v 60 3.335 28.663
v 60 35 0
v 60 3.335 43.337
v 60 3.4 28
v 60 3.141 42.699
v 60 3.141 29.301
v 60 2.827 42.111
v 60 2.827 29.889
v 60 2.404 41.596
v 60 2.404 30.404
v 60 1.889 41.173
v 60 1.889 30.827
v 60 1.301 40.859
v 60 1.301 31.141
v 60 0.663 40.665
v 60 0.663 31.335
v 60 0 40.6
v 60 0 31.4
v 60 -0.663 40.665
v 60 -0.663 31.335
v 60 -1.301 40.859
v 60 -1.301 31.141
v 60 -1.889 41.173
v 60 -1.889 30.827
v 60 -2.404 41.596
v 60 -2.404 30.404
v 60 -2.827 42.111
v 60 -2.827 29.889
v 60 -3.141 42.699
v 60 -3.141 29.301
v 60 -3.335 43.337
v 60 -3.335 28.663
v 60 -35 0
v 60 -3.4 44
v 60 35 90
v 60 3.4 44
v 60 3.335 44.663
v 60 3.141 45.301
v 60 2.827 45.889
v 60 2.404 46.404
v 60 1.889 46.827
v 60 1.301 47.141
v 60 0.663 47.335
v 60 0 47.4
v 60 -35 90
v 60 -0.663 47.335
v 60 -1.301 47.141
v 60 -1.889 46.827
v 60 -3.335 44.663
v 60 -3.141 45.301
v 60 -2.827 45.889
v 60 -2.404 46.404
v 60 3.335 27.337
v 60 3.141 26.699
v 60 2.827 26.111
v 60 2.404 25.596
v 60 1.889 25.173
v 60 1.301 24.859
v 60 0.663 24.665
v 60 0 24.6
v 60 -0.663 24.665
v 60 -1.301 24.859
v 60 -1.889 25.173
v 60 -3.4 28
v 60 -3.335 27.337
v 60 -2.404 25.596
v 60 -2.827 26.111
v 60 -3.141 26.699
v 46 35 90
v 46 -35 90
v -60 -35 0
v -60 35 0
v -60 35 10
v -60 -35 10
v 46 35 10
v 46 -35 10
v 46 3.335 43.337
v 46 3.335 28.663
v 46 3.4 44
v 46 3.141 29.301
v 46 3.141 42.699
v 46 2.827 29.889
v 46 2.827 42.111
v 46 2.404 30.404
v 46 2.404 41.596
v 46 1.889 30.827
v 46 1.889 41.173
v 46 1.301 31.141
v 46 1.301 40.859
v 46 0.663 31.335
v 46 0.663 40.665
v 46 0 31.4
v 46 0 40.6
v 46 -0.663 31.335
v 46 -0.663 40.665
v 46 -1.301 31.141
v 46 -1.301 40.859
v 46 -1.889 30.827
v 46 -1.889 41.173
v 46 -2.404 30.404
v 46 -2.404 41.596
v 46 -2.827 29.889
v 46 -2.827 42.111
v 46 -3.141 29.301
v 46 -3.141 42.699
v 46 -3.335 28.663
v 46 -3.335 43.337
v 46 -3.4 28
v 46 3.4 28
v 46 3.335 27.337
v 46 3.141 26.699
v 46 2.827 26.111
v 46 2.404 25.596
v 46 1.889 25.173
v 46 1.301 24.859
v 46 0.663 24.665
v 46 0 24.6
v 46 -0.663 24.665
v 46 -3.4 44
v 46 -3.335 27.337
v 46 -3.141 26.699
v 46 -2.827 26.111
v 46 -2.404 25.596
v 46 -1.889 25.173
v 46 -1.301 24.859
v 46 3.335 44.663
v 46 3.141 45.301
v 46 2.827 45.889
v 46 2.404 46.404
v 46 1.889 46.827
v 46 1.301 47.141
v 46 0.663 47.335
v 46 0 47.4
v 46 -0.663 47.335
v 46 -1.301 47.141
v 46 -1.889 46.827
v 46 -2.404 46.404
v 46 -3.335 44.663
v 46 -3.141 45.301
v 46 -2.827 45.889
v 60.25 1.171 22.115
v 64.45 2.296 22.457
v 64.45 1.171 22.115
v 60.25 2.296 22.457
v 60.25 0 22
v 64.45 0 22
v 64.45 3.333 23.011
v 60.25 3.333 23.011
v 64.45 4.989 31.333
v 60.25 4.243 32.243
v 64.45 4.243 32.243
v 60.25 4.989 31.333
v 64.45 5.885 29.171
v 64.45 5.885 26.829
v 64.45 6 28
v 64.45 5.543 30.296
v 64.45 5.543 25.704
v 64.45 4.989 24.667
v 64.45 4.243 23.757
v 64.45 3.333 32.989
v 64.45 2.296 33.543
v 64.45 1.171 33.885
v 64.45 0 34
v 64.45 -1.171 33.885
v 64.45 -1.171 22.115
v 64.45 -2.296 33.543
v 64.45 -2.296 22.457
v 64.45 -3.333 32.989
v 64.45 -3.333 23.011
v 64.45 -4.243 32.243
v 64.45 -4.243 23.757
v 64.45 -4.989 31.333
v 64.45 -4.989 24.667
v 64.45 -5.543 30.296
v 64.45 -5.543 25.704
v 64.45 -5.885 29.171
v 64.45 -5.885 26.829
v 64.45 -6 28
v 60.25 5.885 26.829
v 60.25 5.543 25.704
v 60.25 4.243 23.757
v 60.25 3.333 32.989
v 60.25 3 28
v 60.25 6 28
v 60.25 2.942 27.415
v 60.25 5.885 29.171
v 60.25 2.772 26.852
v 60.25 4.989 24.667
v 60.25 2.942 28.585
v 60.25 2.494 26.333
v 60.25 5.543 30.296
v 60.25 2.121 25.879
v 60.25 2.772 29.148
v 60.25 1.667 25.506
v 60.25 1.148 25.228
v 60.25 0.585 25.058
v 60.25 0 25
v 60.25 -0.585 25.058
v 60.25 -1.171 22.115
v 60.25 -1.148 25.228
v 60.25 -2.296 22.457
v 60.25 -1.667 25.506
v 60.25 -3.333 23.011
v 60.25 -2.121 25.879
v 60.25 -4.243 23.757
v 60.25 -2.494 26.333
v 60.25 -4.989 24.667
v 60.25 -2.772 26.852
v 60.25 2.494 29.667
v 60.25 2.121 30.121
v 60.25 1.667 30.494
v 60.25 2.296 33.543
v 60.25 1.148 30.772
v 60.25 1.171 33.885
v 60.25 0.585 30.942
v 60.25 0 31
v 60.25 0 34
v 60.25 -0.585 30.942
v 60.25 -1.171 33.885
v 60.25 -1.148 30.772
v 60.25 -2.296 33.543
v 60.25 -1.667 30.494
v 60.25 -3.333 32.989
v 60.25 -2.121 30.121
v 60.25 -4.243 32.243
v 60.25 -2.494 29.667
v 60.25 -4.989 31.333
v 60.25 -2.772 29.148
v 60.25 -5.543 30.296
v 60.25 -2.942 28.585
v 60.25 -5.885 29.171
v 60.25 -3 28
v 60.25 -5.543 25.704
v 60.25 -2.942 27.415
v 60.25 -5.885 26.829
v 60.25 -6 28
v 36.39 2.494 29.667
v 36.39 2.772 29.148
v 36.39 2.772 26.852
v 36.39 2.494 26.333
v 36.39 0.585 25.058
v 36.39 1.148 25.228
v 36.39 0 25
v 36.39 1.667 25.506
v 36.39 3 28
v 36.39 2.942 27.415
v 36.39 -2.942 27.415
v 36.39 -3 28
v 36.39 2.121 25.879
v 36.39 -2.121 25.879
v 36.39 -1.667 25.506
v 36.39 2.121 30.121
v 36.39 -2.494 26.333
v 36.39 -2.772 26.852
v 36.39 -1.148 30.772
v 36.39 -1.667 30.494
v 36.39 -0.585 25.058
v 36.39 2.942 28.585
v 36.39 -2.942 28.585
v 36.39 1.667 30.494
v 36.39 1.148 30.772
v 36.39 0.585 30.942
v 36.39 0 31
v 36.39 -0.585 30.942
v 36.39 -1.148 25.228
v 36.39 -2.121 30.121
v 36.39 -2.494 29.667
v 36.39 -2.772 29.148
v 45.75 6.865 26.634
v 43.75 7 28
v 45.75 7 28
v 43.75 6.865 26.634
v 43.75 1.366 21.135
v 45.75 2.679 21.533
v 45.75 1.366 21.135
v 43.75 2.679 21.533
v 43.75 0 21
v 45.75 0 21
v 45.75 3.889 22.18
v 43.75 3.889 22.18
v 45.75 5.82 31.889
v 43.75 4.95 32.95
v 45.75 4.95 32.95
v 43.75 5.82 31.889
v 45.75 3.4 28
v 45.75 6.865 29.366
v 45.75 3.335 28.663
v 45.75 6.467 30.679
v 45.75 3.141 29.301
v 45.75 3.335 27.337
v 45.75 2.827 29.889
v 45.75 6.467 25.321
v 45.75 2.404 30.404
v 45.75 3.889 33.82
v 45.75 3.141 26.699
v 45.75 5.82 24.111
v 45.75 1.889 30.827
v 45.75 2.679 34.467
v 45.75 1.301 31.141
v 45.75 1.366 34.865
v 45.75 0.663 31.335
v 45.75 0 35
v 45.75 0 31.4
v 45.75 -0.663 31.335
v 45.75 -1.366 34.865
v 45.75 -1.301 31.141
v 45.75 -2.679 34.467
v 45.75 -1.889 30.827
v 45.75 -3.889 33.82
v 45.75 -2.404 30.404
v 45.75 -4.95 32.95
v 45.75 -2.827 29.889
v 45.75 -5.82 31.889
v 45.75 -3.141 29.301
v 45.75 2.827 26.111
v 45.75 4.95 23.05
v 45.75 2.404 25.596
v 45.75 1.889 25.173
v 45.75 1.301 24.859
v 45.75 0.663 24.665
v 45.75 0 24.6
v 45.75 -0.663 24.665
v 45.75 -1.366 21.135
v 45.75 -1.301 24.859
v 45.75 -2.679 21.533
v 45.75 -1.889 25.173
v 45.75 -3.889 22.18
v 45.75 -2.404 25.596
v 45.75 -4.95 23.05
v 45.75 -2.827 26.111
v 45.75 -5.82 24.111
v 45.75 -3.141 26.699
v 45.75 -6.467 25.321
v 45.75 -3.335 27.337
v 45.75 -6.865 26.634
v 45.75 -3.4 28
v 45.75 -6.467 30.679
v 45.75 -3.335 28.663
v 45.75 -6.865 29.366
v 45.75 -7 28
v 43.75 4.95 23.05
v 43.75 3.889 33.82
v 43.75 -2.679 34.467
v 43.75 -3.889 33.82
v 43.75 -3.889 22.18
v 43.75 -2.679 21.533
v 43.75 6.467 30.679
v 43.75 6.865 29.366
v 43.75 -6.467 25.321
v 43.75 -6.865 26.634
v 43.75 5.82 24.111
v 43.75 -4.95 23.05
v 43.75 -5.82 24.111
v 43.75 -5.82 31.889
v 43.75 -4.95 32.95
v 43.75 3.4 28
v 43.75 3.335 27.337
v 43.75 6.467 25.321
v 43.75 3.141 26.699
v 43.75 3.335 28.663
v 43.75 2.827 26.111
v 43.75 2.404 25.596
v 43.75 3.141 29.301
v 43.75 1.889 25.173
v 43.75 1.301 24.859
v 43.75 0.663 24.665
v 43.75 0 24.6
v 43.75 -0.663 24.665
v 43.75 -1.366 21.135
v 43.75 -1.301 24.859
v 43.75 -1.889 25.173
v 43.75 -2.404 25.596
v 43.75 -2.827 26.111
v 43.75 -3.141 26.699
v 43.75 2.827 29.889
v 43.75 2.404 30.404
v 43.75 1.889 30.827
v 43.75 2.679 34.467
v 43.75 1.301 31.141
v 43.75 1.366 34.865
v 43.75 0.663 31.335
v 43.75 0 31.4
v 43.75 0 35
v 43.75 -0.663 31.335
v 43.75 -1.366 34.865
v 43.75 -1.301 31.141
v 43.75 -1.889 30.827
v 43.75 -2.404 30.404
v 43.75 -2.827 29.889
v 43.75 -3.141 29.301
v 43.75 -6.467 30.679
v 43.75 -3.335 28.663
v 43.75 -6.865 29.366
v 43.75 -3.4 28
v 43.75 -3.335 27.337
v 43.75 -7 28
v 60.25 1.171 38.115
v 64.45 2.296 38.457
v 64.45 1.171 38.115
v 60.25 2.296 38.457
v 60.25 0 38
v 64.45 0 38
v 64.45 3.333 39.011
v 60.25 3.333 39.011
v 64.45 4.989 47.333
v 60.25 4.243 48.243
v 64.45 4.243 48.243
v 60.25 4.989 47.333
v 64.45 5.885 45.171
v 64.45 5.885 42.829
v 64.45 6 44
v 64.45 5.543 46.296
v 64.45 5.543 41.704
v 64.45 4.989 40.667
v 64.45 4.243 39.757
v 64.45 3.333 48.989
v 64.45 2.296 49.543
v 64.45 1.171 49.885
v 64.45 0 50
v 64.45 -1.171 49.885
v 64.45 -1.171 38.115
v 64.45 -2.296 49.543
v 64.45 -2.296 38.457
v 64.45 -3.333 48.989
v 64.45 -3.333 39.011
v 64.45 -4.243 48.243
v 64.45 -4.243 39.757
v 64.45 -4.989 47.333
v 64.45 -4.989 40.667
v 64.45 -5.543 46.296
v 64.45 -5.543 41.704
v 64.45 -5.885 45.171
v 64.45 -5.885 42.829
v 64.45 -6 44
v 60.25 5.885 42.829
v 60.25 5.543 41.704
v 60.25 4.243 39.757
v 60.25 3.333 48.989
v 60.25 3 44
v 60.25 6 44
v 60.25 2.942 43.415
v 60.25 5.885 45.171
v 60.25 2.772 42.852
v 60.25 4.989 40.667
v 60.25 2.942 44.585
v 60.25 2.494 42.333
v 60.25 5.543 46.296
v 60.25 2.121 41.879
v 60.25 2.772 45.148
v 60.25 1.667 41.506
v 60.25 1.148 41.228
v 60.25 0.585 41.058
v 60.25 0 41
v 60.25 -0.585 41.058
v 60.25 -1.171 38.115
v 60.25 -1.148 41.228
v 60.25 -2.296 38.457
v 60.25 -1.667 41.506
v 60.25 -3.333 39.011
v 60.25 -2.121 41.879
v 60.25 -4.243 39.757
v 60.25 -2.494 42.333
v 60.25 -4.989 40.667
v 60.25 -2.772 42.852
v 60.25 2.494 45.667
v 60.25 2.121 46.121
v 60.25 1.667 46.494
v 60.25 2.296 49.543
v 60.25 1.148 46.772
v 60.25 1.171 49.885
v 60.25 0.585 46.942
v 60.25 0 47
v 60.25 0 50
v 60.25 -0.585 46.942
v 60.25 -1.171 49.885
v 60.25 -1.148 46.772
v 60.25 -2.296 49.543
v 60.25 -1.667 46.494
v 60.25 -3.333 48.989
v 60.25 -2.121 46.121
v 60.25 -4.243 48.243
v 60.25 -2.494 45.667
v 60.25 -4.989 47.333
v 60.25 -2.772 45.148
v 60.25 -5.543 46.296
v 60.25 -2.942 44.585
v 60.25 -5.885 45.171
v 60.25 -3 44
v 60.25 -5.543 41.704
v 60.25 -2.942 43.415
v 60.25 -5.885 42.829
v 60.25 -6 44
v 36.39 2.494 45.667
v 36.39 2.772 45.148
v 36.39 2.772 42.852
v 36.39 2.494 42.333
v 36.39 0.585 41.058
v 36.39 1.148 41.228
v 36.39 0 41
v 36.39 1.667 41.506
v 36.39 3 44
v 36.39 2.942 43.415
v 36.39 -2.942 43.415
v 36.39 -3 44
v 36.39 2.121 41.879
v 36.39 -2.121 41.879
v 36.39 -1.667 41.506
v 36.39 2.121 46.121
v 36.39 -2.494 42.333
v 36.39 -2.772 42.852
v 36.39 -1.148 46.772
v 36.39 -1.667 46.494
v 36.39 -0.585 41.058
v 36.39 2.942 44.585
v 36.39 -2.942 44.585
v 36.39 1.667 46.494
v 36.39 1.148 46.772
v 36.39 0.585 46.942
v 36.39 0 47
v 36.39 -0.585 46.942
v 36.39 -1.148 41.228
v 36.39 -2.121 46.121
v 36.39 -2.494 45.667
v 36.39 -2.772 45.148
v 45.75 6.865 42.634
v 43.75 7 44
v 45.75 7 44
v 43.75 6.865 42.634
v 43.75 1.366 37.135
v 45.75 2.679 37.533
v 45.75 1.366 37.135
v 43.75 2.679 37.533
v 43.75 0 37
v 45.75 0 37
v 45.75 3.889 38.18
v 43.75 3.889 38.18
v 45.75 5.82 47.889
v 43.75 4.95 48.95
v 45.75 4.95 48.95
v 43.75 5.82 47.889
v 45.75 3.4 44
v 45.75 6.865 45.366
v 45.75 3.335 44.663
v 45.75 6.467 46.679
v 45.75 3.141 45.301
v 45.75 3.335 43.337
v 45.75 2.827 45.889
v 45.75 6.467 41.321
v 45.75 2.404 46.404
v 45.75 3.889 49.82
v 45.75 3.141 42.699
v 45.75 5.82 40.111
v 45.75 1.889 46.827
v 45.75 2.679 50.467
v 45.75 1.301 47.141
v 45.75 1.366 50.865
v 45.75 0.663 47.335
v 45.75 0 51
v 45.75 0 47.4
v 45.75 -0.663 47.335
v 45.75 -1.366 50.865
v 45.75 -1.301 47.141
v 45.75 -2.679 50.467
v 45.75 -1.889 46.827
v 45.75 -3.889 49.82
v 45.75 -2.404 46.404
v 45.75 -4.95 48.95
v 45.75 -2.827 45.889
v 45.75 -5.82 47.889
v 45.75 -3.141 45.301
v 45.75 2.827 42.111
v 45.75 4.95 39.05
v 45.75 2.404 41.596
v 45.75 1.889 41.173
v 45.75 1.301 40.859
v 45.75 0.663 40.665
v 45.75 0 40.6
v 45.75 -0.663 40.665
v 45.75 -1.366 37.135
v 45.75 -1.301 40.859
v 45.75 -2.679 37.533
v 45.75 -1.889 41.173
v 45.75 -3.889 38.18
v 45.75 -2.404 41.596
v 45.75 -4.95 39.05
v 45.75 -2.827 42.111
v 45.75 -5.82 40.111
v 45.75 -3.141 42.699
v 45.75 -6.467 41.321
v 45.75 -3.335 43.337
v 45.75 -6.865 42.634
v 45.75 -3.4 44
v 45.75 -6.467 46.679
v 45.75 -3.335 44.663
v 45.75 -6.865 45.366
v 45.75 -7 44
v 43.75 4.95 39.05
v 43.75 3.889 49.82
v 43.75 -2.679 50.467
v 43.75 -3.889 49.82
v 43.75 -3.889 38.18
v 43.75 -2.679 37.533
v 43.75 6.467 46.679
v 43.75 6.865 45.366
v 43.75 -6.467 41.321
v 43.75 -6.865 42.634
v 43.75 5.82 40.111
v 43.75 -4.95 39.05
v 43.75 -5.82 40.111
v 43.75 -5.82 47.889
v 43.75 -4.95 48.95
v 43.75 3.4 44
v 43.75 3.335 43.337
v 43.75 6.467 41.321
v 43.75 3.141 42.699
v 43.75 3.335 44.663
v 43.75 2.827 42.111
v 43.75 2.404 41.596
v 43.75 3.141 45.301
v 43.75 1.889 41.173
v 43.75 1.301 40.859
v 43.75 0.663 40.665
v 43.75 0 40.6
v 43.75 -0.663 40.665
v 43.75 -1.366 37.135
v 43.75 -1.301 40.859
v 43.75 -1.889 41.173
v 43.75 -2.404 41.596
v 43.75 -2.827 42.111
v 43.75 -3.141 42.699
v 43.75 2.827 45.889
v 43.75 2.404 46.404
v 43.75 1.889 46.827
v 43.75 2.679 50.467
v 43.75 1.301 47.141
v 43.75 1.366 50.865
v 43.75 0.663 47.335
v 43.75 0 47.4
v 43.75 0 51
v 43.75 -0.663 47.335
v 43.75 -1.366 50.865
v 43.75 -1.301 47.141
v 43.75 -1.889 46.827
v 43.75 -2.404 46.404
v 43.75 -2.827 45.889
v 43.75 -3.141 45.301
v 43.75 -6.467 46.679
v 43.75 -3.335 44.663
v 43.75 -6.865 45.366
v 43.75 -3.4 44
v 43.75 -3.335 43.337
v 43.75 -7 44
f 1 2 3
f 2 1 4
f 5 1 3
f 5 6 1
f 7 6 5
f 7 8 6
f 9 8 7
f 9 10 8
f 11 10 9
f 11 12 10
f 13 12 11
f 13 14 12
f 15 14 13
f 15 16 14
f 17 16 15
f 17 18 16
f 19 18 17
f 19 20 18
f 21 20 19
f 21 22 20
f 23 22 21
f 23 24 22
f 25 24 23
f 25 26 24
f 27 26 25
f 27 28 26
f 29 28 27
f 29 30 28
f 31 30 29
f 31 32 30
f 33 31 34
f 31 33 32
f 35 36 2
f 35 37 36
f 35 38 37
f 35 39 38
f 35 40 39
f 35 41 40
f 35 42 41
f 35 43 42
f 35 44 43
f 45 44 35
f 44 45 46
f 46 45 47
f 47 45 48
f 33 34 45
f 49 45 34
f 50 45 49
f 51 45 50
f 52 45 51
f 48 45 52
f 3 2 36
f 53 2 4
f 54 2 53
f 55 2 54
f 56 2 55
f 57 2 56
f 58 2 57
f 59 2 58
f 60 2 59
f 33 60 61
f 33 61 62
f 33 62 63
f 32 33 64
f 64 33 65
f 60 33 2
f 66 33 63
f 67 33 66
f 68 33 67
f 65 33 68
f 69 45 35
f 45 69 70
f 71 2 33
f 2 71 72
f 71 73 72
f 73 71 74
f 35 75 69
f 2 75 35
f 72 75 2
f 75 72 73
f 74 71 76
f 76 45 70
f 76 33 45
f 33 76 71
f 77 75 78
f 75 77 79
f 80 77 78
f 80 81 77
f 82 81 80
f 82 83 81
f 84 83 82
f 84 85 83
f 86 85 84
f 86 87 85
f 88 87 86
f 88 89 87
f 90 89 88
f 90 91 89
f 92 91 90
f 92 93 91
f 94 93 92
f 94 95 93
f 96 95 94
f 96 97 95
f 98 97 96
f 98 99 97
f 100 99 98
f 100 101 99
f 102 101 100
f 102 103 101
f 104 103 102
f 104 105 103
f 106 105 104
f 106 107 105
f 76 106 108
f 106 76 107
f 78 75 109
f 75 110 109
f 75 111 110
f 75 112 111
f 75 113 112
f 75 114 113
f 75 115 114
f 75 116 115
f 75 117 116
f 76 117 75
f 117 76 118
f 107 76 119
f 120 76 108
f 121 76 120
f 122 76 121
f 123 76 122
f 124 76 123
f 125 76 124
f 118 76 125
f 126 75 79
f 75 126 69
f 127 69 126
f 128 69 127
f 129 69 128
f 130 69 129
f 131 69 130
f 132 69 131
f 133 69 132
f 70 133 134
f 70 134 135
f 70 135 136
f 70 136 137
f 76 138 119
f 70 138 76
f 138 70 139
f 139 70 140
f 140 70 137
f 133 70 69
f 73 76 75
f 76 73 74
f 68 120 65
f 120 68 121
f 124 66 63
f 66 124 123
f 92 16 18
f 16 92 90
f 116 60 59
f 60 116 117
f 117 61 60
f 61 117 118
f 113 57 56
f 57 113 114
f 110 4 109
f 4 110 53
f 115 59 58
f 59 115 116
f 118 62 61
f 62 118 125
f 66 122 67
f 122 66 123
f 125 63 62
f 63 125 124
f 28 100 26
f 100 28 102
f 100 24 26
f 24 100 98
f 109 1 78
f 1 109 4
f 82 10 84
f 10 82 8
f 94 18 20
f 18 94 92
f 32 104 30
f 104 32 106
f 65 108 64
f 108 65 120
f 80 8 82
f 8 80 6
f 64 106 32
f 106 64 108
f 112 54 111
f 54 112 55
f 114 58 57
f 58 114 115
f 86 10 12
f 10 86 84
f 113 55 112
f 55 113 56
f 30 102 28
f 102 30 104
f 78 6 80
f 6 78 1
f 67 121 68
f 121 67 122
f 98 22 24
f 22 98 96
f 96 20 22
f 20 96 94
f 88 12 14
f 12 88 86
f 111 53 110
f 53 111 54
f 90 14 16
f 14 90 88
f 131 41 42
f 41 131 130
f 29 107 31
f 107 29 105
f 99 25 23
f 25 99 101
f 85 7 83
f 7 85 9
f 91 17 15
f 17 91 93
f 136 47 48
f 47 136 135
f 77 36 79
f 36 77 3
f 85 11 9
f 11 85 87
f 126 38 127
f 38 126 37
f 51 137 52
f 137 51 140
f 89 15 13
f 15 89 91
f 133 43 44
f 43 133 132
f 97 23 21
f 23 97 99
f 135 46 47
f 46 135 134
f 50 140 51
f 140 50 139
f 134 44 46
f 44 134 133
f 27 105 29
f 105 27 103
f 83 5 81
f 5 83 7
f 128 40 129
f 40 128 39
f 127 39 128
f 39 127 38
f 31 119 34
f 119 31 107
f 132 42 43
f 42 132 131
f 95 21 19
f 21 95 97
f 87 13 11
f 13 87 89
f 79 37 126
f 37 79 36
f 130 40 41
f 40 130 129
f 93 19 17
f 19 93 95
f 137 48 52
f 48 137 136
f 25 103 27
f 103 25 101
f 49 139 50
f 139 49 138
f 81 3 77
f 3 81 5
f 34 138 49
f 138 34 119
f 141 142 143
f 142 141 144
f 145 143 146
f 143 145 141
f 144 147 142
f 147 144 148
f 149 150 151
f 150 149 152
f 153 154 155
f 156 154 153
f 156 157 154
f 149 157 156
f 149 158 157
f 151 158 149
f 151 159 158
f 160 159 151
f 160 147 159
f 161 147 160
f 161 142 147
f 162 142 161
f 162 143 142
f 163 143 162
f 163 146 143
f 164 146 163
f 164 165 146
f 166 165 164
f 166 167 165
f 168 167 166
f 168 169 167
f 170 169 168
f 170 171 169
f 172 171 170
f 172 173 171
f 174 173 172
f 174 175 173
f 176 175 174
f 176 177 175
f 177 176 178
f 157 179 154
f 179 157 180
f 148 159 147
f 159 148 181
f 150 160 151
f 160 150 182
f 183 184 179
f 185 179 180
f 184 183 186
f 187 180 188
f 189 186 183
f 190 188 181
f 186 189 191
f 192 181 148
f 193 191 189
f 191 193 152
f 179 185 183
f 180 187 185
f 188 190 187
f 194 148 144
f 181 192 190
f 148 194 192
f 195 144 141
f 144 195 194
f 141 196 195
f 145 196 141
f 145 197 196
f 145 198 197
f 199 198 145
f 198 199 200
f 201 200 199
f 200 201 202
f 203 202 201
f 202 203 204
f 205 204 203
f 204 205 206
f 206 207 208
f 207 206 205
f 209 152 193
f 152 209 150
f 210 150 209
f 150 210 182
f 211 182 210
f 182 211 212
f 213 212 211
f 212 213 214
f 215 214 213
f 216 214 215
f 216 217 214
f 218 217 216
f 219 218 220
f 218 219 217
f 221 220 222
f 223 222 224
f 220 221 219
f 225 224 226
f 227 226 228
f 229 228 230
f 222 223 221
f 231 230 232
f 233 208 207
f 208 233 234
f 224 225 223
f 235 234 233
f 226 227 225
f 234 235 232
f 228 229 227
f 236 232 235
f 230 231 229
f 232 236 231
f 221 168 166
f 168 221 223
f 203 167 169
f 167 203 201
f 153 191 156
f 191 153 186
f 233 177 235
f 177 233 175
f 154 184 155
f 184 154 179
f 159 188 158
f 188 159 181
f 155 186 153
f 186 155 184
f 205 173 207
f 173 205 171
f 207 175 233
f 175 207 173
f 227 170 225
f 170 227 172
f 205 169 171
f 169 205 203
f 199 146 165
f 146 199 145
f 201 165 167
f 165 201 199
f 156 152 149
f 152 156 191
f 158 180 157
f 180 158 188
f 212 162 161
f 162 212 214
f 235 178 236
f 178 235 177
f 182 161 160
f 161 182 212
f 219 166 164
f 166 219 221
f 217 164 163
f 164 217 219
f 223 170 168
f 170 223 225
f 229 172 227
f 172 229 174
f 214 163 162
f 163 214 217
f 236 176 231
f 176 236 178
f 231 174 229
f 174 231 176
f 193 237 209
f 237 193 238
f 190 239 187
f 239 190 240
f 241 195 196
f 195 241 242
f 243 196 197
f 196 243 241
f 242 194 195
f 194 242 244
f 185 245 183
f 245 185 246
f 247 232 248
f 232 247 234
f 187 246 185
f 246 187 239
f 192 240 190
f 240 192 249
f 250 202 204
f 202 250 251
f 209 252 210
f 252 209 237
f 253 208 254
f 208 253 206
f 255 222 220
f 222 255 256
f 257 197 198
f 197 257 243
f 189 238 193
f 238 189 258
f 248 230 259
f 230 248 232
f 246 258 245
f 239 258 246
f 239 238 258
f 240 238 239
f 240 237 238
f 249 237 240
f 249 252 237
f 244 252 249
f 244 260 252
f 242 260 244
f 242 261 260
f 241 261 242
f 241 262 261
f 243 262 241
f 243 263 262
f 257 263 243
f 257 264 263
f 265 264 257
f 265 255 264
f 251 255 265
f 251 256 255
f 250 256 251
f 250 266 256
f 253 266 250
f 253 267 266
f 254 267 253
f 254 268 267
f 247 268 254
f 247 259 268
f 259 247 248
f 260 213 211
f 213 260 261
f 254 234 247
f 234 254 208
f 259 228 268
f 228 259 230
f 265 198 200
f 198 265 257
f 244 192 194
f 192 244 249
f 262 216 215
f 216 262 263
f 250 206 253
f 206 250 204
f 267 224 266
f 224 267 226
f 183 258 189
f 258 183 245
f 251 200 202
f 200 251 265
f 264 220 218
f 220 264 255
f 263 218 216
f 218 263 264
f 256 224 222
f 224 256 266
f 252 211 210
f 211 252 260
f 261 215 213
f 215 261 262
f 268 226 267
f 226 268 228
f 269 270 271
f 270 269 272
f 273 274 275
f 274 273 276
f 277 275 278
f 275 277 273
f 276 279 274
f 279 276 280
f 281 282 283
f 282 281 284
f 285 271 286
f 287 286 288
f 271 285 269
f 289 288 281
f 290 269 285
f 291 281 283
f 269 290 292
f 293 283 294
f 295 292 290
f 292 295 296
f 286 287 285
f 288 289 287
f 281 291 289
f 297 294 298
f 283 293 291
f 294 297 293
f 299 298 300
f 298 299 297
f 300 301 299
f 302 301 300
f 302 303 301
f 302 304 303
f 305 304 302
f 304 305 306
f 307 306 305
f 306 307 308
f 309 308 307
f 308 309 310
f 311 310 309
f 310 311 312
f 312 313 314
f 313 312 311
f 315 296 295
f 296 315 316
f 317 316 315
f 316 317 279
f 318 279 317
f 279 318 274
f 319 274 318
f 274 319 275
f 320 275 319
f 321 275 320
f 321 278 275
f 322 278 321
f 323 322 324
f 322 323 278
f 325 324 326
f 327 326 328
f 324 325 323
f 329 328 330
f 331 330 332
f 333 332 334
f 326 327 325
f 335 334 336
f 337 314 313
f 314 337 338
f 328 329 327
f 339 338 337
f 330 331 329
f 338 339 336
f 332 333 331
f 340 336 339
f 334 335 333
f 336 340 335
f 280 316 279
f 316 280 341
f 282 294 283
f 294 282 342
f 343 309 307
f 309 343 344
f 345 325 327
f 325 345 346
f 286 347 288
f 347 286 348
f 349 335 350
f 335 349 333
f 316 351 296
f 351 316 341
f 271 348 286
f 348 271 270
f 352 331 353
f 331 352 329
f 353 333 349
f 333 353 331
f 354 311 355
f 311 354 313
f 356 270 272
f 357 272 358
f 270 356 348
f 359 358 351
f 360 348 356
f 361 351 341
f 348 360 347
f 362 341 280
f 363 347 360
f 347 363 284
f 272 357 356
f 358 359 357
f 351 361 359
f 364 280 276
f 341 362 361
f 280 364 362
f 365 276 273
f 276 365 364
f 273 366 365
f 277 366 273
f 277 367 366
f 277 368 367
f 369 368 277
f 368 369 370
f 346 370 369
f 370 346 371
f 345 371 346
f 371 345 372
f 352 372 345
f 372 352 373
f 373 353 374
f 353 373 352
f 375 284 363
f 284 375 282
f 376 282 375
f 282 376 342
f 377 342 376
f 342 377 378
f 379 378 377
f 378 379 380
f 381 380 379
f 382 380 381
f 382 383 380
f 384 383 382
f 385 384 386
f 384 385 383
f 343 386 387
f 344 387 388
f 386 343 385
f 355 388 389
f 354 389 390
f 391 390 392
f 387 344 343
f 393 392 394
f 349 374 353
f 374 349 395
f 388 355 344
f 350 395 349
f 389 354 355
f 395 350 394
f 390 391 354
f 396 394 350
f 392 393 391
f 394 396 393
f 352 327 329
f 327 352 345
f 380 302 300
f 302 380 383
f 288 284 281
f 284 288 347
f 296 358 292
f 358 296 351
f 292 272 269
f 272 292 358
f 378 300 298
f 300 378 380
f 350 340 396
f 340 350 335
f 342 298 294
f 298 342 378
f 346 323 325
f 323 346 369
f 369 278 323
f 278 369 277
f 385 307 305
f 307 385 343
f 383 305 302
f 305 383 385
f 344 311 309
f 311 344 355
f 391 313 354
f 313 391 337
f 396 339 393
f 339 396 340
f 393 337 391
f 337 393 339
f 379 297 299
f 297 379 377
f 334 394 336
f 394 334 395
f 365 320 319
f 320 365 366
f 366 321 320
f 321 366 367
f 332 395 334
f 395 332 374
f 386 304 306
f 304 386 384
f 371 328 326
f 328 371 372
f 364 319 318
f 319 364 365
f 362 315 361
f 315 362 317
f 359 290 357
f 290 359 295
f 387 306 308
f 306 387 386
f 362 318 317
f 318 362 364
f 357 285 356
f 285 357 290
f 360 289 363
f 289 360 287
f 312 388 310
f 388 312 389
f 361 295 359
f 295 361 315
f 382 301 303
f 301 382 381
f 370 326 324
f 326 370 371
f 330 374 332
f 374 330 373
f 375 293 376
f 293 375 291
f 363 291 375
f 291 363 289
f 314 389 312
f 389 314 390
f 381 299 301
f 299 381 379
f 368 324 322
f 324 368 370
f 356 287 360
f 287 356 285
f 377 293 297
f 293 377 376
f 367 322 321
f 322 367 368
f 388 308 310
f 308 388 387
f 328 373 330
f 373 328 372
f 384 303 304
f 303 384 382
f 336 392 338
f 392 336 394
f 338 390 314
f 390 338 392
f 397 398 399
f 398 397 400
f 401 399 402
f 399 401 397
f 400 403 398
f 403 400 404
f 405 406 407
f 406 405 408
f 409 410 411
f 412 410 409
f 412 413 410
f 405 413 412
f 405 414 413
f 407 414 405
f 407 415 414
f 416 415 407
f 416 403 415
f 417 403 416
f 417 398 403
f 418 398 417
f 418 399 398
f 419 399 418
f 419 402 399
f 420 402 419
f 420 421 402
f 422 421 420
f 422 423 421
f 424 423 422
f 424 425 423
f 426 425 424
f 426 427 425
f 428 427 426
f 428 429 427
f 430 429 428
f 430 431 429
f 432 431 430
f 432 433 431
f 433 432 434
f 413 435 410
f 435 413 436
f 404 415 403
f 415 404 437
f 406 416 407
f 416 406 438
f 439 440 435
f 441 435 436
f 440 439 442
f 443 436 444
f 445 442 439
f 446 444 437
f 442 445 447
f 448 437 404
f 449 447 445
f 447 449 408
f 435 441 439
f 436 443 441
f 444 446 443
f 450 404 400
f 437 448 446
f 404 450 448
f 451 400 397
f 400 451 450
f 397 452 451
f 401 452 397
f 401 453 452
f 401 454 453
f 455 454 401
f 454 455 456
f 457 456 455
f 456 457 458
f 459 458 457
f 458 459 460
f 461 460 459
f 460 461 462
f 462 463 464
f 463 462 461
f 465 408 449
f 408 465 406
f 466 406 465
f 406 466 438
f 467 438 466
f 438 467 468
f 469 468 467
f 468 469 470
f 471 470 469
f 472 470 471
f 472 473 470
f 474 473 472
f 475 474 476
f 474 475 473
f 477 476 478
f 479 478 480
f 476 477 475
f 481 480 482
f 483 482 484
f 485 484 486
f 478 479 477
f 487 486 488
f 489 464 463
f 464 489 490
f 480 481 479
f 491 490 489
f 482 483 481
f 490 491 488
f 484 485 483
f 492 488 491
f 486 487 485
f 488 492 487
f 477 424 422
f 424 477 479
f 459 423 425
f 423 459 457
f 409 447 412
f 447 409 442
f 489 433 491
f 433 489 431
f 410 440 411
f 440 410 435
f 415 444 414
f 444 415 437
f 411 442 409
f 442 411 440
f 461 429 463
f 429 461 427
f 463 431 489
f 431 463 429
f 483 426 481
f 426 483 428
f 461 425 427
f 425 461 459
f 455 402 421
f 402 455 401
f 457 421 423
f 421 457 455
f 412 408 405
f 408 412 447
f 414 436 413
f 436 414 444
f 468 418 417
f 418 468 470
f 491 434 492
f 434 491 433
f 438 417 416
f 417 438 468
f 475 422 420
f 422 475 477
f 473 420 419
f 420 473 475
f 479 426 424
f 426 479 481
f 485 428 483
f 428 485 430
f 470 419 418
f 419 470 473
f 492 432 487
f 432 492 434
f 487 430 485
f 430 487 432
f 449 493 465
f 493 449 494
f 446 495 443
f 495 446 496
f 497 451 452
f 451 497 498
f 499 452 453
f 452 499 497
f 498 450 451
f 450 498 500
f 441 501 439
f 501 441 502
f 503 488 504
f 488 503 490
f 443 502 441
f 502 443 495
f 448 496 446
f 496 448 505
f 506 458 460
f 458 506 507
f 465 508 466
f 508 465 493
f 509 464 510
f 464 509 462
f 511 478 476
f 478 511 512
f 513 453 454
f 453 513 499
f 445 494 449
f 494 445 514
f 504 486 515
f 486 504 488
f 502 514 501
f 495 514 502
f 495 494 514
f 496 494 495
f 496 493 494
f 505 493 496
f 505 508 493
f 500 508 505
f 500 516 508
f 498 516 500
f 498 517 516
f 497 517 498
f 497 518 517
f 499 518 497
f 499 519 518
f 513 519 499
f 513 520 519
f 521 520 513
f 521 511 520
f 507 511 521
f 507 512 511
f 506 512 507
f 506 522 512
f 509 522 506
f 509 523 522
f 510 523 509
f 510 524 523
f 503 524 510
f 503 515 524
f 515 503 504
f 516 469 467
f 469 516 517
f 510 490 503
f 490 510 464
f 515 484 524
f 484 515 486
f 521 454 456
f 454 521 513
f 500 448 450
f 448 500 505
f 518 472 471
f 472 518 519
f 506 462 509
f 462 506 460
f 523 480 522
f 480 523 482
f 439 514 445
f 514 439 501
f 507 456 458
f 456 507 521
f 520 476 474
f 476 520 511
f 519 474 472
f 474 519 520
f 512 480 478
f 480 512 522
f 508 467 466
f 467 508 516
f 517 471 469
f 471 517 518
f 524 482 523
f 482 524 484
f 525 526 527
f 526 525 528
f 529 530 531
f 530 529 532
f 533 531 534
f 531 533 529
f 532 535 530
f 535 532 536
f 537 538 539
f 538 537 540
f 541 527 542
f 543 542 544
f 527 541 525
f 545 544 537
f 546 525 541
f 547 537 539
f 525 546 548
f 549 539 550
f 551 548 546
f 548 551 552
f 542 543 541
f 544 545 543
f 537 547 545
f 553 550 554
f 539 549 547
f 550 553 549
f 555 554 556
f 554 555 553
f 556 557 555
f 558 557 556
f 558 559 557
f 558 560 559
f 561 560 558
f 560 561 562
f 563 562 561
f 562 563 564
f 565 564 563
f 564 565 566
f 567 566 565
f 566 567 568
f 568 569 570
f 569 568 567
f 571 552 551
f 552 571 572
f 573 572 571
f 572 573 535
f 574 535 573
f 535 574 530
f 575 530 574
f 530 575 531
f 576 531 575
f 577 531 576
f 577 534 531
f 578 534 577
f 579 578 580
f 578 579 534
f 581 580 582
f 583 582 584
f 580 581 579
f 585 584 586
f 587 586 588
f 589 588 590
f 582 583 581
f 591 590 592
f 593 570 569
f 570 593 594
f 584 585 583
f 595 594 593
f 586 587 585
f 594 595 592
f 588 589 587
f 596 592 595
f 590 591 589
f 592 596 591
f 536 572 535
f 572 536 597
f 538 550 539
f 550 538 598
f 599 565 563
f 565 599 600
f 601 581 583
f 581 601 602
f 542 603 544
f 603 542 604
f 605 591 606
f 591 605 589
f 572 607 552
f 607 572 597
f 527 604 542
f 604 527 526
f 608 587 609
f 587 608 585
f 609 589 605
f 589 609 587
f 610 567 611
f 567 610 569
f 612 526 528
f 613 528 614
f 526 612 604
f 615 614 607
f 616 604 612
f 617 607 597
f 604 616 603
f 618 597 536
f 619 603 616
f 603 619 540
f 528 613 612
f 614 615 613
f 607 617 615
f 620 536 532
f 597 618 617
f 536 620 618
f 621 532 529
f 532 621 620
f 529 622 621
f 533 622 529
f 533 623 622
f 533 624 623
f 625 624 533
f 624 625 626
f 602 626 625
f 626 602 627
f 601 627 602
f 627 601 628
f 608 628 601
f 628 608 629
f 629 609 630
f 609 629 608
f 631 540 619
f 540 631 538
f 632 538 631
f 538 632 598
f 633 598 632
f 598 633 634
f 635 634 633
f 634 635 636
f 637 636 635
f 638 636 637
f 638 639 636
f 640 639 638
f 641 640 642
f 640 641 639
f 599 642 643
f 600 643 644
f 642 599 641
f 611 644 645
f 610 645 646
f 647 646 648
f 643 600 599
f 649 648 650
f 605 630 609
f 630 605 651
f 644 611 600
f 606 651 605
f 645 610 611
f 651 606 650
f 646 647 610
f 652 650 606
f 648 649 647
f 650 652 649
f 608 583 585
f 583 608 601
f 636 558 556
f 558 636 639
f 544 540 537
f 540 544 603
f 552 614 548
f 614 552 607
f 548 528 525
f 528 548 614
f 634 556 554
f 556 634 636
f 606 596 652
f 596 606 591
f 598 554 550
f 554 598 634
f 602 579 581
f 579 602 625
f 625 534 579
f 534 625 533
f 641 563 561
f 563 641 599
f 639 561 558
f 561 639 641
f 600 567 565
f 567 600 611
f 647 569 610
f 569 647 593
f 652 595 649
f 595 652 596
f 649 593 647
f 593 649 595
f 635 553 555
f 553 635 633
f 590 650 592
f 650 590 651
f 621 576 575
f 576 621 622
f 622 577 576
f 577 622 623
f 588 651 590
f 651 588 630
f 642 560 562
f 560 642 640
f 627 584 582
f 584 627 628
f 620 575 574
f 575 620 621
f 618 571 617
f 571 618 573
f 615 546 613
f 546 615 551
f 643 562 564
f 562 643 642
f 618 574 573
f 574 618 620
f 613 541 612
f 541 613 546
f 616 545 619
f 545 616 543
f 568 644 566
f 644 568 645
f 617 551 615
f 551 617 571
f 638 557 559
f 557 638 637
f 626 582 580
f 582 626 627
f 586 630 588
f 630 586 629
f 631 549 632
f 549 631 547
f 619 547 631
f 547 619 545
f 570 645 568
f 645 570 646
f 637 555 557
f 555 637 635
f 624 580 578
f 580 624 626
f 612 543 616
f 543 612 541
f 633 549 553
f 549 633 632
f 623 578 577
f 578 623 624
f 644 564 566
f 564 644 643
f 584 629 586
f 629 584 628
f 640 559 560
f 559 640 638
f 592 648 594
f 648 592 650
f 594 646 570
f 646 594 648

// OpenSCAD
$fn = 32;

// ------------------------------------------------------------------------
// Bolted bracket: 120 x 70 mm bracket with 2 bolt joints
// Every part is its own module, assembly() places them once.
// ------------------------------------------------------------------------

// --- part 1 ---
module bracket() {
  difference() {
    translate([-60, -35, 0]) cube([120, 70, 90]);
    translate([-61, -36, 10]) cube([107, 72, 81]);
    translate([53, 0, 28]) rotate([0, 90, 0]) cylinder(h = 16, d = 6.8, center = true);
    translate([53, 0, 44]) rotate([0, 90, 0]) cylinder(h = 16, d = 6.8, center = true);
  }
}

// --- part 2 ---
module bolt1() {
  cylinder(h = 4.2, d = 12);
  translate([0, 0, -23.86]) cylinder(h = 23.86, d = 6);
}

// --- part 3 ---
module washer1() {
  difference() {
      translate([0, 0, 0]) cylinder(h = 2, d = 14);
      translate([0, 0, -1]) cylinder(h = 4, d = 6.8);
    }
}

// --- part 4 ---
module bolt2() {
  cylinder(h = 4.2, d = 12);
  translate([0, 0, -23.86]) cylinder(h = 23.86, d = 6);
}

// --- part 5 ---
module washer2() {
  difference() {
      translate([0, 0, 0]) cylinder(h = 2, d = 14);
      translate([0, 0, -1]) cylinder(h = 4, d = 6.8);
    }
}

// --- assembly ---
module assembly() {
  translate([0, 0, 0]) rotate([0, 0, 0]) bracket();
  translate([60.25, 0, 28]) rotate([0, 90, 0]) bolt1();
  translate([43.75, 0, 28]) rotate([0, 90, 0]) washer1();
  translate([60.25, 0, 44]) rotate([0, 90, 0]) bolt2();
  translate([43.75, 0, 44]) rotate([0, 90, 0]) washer2();
}

assembly();
